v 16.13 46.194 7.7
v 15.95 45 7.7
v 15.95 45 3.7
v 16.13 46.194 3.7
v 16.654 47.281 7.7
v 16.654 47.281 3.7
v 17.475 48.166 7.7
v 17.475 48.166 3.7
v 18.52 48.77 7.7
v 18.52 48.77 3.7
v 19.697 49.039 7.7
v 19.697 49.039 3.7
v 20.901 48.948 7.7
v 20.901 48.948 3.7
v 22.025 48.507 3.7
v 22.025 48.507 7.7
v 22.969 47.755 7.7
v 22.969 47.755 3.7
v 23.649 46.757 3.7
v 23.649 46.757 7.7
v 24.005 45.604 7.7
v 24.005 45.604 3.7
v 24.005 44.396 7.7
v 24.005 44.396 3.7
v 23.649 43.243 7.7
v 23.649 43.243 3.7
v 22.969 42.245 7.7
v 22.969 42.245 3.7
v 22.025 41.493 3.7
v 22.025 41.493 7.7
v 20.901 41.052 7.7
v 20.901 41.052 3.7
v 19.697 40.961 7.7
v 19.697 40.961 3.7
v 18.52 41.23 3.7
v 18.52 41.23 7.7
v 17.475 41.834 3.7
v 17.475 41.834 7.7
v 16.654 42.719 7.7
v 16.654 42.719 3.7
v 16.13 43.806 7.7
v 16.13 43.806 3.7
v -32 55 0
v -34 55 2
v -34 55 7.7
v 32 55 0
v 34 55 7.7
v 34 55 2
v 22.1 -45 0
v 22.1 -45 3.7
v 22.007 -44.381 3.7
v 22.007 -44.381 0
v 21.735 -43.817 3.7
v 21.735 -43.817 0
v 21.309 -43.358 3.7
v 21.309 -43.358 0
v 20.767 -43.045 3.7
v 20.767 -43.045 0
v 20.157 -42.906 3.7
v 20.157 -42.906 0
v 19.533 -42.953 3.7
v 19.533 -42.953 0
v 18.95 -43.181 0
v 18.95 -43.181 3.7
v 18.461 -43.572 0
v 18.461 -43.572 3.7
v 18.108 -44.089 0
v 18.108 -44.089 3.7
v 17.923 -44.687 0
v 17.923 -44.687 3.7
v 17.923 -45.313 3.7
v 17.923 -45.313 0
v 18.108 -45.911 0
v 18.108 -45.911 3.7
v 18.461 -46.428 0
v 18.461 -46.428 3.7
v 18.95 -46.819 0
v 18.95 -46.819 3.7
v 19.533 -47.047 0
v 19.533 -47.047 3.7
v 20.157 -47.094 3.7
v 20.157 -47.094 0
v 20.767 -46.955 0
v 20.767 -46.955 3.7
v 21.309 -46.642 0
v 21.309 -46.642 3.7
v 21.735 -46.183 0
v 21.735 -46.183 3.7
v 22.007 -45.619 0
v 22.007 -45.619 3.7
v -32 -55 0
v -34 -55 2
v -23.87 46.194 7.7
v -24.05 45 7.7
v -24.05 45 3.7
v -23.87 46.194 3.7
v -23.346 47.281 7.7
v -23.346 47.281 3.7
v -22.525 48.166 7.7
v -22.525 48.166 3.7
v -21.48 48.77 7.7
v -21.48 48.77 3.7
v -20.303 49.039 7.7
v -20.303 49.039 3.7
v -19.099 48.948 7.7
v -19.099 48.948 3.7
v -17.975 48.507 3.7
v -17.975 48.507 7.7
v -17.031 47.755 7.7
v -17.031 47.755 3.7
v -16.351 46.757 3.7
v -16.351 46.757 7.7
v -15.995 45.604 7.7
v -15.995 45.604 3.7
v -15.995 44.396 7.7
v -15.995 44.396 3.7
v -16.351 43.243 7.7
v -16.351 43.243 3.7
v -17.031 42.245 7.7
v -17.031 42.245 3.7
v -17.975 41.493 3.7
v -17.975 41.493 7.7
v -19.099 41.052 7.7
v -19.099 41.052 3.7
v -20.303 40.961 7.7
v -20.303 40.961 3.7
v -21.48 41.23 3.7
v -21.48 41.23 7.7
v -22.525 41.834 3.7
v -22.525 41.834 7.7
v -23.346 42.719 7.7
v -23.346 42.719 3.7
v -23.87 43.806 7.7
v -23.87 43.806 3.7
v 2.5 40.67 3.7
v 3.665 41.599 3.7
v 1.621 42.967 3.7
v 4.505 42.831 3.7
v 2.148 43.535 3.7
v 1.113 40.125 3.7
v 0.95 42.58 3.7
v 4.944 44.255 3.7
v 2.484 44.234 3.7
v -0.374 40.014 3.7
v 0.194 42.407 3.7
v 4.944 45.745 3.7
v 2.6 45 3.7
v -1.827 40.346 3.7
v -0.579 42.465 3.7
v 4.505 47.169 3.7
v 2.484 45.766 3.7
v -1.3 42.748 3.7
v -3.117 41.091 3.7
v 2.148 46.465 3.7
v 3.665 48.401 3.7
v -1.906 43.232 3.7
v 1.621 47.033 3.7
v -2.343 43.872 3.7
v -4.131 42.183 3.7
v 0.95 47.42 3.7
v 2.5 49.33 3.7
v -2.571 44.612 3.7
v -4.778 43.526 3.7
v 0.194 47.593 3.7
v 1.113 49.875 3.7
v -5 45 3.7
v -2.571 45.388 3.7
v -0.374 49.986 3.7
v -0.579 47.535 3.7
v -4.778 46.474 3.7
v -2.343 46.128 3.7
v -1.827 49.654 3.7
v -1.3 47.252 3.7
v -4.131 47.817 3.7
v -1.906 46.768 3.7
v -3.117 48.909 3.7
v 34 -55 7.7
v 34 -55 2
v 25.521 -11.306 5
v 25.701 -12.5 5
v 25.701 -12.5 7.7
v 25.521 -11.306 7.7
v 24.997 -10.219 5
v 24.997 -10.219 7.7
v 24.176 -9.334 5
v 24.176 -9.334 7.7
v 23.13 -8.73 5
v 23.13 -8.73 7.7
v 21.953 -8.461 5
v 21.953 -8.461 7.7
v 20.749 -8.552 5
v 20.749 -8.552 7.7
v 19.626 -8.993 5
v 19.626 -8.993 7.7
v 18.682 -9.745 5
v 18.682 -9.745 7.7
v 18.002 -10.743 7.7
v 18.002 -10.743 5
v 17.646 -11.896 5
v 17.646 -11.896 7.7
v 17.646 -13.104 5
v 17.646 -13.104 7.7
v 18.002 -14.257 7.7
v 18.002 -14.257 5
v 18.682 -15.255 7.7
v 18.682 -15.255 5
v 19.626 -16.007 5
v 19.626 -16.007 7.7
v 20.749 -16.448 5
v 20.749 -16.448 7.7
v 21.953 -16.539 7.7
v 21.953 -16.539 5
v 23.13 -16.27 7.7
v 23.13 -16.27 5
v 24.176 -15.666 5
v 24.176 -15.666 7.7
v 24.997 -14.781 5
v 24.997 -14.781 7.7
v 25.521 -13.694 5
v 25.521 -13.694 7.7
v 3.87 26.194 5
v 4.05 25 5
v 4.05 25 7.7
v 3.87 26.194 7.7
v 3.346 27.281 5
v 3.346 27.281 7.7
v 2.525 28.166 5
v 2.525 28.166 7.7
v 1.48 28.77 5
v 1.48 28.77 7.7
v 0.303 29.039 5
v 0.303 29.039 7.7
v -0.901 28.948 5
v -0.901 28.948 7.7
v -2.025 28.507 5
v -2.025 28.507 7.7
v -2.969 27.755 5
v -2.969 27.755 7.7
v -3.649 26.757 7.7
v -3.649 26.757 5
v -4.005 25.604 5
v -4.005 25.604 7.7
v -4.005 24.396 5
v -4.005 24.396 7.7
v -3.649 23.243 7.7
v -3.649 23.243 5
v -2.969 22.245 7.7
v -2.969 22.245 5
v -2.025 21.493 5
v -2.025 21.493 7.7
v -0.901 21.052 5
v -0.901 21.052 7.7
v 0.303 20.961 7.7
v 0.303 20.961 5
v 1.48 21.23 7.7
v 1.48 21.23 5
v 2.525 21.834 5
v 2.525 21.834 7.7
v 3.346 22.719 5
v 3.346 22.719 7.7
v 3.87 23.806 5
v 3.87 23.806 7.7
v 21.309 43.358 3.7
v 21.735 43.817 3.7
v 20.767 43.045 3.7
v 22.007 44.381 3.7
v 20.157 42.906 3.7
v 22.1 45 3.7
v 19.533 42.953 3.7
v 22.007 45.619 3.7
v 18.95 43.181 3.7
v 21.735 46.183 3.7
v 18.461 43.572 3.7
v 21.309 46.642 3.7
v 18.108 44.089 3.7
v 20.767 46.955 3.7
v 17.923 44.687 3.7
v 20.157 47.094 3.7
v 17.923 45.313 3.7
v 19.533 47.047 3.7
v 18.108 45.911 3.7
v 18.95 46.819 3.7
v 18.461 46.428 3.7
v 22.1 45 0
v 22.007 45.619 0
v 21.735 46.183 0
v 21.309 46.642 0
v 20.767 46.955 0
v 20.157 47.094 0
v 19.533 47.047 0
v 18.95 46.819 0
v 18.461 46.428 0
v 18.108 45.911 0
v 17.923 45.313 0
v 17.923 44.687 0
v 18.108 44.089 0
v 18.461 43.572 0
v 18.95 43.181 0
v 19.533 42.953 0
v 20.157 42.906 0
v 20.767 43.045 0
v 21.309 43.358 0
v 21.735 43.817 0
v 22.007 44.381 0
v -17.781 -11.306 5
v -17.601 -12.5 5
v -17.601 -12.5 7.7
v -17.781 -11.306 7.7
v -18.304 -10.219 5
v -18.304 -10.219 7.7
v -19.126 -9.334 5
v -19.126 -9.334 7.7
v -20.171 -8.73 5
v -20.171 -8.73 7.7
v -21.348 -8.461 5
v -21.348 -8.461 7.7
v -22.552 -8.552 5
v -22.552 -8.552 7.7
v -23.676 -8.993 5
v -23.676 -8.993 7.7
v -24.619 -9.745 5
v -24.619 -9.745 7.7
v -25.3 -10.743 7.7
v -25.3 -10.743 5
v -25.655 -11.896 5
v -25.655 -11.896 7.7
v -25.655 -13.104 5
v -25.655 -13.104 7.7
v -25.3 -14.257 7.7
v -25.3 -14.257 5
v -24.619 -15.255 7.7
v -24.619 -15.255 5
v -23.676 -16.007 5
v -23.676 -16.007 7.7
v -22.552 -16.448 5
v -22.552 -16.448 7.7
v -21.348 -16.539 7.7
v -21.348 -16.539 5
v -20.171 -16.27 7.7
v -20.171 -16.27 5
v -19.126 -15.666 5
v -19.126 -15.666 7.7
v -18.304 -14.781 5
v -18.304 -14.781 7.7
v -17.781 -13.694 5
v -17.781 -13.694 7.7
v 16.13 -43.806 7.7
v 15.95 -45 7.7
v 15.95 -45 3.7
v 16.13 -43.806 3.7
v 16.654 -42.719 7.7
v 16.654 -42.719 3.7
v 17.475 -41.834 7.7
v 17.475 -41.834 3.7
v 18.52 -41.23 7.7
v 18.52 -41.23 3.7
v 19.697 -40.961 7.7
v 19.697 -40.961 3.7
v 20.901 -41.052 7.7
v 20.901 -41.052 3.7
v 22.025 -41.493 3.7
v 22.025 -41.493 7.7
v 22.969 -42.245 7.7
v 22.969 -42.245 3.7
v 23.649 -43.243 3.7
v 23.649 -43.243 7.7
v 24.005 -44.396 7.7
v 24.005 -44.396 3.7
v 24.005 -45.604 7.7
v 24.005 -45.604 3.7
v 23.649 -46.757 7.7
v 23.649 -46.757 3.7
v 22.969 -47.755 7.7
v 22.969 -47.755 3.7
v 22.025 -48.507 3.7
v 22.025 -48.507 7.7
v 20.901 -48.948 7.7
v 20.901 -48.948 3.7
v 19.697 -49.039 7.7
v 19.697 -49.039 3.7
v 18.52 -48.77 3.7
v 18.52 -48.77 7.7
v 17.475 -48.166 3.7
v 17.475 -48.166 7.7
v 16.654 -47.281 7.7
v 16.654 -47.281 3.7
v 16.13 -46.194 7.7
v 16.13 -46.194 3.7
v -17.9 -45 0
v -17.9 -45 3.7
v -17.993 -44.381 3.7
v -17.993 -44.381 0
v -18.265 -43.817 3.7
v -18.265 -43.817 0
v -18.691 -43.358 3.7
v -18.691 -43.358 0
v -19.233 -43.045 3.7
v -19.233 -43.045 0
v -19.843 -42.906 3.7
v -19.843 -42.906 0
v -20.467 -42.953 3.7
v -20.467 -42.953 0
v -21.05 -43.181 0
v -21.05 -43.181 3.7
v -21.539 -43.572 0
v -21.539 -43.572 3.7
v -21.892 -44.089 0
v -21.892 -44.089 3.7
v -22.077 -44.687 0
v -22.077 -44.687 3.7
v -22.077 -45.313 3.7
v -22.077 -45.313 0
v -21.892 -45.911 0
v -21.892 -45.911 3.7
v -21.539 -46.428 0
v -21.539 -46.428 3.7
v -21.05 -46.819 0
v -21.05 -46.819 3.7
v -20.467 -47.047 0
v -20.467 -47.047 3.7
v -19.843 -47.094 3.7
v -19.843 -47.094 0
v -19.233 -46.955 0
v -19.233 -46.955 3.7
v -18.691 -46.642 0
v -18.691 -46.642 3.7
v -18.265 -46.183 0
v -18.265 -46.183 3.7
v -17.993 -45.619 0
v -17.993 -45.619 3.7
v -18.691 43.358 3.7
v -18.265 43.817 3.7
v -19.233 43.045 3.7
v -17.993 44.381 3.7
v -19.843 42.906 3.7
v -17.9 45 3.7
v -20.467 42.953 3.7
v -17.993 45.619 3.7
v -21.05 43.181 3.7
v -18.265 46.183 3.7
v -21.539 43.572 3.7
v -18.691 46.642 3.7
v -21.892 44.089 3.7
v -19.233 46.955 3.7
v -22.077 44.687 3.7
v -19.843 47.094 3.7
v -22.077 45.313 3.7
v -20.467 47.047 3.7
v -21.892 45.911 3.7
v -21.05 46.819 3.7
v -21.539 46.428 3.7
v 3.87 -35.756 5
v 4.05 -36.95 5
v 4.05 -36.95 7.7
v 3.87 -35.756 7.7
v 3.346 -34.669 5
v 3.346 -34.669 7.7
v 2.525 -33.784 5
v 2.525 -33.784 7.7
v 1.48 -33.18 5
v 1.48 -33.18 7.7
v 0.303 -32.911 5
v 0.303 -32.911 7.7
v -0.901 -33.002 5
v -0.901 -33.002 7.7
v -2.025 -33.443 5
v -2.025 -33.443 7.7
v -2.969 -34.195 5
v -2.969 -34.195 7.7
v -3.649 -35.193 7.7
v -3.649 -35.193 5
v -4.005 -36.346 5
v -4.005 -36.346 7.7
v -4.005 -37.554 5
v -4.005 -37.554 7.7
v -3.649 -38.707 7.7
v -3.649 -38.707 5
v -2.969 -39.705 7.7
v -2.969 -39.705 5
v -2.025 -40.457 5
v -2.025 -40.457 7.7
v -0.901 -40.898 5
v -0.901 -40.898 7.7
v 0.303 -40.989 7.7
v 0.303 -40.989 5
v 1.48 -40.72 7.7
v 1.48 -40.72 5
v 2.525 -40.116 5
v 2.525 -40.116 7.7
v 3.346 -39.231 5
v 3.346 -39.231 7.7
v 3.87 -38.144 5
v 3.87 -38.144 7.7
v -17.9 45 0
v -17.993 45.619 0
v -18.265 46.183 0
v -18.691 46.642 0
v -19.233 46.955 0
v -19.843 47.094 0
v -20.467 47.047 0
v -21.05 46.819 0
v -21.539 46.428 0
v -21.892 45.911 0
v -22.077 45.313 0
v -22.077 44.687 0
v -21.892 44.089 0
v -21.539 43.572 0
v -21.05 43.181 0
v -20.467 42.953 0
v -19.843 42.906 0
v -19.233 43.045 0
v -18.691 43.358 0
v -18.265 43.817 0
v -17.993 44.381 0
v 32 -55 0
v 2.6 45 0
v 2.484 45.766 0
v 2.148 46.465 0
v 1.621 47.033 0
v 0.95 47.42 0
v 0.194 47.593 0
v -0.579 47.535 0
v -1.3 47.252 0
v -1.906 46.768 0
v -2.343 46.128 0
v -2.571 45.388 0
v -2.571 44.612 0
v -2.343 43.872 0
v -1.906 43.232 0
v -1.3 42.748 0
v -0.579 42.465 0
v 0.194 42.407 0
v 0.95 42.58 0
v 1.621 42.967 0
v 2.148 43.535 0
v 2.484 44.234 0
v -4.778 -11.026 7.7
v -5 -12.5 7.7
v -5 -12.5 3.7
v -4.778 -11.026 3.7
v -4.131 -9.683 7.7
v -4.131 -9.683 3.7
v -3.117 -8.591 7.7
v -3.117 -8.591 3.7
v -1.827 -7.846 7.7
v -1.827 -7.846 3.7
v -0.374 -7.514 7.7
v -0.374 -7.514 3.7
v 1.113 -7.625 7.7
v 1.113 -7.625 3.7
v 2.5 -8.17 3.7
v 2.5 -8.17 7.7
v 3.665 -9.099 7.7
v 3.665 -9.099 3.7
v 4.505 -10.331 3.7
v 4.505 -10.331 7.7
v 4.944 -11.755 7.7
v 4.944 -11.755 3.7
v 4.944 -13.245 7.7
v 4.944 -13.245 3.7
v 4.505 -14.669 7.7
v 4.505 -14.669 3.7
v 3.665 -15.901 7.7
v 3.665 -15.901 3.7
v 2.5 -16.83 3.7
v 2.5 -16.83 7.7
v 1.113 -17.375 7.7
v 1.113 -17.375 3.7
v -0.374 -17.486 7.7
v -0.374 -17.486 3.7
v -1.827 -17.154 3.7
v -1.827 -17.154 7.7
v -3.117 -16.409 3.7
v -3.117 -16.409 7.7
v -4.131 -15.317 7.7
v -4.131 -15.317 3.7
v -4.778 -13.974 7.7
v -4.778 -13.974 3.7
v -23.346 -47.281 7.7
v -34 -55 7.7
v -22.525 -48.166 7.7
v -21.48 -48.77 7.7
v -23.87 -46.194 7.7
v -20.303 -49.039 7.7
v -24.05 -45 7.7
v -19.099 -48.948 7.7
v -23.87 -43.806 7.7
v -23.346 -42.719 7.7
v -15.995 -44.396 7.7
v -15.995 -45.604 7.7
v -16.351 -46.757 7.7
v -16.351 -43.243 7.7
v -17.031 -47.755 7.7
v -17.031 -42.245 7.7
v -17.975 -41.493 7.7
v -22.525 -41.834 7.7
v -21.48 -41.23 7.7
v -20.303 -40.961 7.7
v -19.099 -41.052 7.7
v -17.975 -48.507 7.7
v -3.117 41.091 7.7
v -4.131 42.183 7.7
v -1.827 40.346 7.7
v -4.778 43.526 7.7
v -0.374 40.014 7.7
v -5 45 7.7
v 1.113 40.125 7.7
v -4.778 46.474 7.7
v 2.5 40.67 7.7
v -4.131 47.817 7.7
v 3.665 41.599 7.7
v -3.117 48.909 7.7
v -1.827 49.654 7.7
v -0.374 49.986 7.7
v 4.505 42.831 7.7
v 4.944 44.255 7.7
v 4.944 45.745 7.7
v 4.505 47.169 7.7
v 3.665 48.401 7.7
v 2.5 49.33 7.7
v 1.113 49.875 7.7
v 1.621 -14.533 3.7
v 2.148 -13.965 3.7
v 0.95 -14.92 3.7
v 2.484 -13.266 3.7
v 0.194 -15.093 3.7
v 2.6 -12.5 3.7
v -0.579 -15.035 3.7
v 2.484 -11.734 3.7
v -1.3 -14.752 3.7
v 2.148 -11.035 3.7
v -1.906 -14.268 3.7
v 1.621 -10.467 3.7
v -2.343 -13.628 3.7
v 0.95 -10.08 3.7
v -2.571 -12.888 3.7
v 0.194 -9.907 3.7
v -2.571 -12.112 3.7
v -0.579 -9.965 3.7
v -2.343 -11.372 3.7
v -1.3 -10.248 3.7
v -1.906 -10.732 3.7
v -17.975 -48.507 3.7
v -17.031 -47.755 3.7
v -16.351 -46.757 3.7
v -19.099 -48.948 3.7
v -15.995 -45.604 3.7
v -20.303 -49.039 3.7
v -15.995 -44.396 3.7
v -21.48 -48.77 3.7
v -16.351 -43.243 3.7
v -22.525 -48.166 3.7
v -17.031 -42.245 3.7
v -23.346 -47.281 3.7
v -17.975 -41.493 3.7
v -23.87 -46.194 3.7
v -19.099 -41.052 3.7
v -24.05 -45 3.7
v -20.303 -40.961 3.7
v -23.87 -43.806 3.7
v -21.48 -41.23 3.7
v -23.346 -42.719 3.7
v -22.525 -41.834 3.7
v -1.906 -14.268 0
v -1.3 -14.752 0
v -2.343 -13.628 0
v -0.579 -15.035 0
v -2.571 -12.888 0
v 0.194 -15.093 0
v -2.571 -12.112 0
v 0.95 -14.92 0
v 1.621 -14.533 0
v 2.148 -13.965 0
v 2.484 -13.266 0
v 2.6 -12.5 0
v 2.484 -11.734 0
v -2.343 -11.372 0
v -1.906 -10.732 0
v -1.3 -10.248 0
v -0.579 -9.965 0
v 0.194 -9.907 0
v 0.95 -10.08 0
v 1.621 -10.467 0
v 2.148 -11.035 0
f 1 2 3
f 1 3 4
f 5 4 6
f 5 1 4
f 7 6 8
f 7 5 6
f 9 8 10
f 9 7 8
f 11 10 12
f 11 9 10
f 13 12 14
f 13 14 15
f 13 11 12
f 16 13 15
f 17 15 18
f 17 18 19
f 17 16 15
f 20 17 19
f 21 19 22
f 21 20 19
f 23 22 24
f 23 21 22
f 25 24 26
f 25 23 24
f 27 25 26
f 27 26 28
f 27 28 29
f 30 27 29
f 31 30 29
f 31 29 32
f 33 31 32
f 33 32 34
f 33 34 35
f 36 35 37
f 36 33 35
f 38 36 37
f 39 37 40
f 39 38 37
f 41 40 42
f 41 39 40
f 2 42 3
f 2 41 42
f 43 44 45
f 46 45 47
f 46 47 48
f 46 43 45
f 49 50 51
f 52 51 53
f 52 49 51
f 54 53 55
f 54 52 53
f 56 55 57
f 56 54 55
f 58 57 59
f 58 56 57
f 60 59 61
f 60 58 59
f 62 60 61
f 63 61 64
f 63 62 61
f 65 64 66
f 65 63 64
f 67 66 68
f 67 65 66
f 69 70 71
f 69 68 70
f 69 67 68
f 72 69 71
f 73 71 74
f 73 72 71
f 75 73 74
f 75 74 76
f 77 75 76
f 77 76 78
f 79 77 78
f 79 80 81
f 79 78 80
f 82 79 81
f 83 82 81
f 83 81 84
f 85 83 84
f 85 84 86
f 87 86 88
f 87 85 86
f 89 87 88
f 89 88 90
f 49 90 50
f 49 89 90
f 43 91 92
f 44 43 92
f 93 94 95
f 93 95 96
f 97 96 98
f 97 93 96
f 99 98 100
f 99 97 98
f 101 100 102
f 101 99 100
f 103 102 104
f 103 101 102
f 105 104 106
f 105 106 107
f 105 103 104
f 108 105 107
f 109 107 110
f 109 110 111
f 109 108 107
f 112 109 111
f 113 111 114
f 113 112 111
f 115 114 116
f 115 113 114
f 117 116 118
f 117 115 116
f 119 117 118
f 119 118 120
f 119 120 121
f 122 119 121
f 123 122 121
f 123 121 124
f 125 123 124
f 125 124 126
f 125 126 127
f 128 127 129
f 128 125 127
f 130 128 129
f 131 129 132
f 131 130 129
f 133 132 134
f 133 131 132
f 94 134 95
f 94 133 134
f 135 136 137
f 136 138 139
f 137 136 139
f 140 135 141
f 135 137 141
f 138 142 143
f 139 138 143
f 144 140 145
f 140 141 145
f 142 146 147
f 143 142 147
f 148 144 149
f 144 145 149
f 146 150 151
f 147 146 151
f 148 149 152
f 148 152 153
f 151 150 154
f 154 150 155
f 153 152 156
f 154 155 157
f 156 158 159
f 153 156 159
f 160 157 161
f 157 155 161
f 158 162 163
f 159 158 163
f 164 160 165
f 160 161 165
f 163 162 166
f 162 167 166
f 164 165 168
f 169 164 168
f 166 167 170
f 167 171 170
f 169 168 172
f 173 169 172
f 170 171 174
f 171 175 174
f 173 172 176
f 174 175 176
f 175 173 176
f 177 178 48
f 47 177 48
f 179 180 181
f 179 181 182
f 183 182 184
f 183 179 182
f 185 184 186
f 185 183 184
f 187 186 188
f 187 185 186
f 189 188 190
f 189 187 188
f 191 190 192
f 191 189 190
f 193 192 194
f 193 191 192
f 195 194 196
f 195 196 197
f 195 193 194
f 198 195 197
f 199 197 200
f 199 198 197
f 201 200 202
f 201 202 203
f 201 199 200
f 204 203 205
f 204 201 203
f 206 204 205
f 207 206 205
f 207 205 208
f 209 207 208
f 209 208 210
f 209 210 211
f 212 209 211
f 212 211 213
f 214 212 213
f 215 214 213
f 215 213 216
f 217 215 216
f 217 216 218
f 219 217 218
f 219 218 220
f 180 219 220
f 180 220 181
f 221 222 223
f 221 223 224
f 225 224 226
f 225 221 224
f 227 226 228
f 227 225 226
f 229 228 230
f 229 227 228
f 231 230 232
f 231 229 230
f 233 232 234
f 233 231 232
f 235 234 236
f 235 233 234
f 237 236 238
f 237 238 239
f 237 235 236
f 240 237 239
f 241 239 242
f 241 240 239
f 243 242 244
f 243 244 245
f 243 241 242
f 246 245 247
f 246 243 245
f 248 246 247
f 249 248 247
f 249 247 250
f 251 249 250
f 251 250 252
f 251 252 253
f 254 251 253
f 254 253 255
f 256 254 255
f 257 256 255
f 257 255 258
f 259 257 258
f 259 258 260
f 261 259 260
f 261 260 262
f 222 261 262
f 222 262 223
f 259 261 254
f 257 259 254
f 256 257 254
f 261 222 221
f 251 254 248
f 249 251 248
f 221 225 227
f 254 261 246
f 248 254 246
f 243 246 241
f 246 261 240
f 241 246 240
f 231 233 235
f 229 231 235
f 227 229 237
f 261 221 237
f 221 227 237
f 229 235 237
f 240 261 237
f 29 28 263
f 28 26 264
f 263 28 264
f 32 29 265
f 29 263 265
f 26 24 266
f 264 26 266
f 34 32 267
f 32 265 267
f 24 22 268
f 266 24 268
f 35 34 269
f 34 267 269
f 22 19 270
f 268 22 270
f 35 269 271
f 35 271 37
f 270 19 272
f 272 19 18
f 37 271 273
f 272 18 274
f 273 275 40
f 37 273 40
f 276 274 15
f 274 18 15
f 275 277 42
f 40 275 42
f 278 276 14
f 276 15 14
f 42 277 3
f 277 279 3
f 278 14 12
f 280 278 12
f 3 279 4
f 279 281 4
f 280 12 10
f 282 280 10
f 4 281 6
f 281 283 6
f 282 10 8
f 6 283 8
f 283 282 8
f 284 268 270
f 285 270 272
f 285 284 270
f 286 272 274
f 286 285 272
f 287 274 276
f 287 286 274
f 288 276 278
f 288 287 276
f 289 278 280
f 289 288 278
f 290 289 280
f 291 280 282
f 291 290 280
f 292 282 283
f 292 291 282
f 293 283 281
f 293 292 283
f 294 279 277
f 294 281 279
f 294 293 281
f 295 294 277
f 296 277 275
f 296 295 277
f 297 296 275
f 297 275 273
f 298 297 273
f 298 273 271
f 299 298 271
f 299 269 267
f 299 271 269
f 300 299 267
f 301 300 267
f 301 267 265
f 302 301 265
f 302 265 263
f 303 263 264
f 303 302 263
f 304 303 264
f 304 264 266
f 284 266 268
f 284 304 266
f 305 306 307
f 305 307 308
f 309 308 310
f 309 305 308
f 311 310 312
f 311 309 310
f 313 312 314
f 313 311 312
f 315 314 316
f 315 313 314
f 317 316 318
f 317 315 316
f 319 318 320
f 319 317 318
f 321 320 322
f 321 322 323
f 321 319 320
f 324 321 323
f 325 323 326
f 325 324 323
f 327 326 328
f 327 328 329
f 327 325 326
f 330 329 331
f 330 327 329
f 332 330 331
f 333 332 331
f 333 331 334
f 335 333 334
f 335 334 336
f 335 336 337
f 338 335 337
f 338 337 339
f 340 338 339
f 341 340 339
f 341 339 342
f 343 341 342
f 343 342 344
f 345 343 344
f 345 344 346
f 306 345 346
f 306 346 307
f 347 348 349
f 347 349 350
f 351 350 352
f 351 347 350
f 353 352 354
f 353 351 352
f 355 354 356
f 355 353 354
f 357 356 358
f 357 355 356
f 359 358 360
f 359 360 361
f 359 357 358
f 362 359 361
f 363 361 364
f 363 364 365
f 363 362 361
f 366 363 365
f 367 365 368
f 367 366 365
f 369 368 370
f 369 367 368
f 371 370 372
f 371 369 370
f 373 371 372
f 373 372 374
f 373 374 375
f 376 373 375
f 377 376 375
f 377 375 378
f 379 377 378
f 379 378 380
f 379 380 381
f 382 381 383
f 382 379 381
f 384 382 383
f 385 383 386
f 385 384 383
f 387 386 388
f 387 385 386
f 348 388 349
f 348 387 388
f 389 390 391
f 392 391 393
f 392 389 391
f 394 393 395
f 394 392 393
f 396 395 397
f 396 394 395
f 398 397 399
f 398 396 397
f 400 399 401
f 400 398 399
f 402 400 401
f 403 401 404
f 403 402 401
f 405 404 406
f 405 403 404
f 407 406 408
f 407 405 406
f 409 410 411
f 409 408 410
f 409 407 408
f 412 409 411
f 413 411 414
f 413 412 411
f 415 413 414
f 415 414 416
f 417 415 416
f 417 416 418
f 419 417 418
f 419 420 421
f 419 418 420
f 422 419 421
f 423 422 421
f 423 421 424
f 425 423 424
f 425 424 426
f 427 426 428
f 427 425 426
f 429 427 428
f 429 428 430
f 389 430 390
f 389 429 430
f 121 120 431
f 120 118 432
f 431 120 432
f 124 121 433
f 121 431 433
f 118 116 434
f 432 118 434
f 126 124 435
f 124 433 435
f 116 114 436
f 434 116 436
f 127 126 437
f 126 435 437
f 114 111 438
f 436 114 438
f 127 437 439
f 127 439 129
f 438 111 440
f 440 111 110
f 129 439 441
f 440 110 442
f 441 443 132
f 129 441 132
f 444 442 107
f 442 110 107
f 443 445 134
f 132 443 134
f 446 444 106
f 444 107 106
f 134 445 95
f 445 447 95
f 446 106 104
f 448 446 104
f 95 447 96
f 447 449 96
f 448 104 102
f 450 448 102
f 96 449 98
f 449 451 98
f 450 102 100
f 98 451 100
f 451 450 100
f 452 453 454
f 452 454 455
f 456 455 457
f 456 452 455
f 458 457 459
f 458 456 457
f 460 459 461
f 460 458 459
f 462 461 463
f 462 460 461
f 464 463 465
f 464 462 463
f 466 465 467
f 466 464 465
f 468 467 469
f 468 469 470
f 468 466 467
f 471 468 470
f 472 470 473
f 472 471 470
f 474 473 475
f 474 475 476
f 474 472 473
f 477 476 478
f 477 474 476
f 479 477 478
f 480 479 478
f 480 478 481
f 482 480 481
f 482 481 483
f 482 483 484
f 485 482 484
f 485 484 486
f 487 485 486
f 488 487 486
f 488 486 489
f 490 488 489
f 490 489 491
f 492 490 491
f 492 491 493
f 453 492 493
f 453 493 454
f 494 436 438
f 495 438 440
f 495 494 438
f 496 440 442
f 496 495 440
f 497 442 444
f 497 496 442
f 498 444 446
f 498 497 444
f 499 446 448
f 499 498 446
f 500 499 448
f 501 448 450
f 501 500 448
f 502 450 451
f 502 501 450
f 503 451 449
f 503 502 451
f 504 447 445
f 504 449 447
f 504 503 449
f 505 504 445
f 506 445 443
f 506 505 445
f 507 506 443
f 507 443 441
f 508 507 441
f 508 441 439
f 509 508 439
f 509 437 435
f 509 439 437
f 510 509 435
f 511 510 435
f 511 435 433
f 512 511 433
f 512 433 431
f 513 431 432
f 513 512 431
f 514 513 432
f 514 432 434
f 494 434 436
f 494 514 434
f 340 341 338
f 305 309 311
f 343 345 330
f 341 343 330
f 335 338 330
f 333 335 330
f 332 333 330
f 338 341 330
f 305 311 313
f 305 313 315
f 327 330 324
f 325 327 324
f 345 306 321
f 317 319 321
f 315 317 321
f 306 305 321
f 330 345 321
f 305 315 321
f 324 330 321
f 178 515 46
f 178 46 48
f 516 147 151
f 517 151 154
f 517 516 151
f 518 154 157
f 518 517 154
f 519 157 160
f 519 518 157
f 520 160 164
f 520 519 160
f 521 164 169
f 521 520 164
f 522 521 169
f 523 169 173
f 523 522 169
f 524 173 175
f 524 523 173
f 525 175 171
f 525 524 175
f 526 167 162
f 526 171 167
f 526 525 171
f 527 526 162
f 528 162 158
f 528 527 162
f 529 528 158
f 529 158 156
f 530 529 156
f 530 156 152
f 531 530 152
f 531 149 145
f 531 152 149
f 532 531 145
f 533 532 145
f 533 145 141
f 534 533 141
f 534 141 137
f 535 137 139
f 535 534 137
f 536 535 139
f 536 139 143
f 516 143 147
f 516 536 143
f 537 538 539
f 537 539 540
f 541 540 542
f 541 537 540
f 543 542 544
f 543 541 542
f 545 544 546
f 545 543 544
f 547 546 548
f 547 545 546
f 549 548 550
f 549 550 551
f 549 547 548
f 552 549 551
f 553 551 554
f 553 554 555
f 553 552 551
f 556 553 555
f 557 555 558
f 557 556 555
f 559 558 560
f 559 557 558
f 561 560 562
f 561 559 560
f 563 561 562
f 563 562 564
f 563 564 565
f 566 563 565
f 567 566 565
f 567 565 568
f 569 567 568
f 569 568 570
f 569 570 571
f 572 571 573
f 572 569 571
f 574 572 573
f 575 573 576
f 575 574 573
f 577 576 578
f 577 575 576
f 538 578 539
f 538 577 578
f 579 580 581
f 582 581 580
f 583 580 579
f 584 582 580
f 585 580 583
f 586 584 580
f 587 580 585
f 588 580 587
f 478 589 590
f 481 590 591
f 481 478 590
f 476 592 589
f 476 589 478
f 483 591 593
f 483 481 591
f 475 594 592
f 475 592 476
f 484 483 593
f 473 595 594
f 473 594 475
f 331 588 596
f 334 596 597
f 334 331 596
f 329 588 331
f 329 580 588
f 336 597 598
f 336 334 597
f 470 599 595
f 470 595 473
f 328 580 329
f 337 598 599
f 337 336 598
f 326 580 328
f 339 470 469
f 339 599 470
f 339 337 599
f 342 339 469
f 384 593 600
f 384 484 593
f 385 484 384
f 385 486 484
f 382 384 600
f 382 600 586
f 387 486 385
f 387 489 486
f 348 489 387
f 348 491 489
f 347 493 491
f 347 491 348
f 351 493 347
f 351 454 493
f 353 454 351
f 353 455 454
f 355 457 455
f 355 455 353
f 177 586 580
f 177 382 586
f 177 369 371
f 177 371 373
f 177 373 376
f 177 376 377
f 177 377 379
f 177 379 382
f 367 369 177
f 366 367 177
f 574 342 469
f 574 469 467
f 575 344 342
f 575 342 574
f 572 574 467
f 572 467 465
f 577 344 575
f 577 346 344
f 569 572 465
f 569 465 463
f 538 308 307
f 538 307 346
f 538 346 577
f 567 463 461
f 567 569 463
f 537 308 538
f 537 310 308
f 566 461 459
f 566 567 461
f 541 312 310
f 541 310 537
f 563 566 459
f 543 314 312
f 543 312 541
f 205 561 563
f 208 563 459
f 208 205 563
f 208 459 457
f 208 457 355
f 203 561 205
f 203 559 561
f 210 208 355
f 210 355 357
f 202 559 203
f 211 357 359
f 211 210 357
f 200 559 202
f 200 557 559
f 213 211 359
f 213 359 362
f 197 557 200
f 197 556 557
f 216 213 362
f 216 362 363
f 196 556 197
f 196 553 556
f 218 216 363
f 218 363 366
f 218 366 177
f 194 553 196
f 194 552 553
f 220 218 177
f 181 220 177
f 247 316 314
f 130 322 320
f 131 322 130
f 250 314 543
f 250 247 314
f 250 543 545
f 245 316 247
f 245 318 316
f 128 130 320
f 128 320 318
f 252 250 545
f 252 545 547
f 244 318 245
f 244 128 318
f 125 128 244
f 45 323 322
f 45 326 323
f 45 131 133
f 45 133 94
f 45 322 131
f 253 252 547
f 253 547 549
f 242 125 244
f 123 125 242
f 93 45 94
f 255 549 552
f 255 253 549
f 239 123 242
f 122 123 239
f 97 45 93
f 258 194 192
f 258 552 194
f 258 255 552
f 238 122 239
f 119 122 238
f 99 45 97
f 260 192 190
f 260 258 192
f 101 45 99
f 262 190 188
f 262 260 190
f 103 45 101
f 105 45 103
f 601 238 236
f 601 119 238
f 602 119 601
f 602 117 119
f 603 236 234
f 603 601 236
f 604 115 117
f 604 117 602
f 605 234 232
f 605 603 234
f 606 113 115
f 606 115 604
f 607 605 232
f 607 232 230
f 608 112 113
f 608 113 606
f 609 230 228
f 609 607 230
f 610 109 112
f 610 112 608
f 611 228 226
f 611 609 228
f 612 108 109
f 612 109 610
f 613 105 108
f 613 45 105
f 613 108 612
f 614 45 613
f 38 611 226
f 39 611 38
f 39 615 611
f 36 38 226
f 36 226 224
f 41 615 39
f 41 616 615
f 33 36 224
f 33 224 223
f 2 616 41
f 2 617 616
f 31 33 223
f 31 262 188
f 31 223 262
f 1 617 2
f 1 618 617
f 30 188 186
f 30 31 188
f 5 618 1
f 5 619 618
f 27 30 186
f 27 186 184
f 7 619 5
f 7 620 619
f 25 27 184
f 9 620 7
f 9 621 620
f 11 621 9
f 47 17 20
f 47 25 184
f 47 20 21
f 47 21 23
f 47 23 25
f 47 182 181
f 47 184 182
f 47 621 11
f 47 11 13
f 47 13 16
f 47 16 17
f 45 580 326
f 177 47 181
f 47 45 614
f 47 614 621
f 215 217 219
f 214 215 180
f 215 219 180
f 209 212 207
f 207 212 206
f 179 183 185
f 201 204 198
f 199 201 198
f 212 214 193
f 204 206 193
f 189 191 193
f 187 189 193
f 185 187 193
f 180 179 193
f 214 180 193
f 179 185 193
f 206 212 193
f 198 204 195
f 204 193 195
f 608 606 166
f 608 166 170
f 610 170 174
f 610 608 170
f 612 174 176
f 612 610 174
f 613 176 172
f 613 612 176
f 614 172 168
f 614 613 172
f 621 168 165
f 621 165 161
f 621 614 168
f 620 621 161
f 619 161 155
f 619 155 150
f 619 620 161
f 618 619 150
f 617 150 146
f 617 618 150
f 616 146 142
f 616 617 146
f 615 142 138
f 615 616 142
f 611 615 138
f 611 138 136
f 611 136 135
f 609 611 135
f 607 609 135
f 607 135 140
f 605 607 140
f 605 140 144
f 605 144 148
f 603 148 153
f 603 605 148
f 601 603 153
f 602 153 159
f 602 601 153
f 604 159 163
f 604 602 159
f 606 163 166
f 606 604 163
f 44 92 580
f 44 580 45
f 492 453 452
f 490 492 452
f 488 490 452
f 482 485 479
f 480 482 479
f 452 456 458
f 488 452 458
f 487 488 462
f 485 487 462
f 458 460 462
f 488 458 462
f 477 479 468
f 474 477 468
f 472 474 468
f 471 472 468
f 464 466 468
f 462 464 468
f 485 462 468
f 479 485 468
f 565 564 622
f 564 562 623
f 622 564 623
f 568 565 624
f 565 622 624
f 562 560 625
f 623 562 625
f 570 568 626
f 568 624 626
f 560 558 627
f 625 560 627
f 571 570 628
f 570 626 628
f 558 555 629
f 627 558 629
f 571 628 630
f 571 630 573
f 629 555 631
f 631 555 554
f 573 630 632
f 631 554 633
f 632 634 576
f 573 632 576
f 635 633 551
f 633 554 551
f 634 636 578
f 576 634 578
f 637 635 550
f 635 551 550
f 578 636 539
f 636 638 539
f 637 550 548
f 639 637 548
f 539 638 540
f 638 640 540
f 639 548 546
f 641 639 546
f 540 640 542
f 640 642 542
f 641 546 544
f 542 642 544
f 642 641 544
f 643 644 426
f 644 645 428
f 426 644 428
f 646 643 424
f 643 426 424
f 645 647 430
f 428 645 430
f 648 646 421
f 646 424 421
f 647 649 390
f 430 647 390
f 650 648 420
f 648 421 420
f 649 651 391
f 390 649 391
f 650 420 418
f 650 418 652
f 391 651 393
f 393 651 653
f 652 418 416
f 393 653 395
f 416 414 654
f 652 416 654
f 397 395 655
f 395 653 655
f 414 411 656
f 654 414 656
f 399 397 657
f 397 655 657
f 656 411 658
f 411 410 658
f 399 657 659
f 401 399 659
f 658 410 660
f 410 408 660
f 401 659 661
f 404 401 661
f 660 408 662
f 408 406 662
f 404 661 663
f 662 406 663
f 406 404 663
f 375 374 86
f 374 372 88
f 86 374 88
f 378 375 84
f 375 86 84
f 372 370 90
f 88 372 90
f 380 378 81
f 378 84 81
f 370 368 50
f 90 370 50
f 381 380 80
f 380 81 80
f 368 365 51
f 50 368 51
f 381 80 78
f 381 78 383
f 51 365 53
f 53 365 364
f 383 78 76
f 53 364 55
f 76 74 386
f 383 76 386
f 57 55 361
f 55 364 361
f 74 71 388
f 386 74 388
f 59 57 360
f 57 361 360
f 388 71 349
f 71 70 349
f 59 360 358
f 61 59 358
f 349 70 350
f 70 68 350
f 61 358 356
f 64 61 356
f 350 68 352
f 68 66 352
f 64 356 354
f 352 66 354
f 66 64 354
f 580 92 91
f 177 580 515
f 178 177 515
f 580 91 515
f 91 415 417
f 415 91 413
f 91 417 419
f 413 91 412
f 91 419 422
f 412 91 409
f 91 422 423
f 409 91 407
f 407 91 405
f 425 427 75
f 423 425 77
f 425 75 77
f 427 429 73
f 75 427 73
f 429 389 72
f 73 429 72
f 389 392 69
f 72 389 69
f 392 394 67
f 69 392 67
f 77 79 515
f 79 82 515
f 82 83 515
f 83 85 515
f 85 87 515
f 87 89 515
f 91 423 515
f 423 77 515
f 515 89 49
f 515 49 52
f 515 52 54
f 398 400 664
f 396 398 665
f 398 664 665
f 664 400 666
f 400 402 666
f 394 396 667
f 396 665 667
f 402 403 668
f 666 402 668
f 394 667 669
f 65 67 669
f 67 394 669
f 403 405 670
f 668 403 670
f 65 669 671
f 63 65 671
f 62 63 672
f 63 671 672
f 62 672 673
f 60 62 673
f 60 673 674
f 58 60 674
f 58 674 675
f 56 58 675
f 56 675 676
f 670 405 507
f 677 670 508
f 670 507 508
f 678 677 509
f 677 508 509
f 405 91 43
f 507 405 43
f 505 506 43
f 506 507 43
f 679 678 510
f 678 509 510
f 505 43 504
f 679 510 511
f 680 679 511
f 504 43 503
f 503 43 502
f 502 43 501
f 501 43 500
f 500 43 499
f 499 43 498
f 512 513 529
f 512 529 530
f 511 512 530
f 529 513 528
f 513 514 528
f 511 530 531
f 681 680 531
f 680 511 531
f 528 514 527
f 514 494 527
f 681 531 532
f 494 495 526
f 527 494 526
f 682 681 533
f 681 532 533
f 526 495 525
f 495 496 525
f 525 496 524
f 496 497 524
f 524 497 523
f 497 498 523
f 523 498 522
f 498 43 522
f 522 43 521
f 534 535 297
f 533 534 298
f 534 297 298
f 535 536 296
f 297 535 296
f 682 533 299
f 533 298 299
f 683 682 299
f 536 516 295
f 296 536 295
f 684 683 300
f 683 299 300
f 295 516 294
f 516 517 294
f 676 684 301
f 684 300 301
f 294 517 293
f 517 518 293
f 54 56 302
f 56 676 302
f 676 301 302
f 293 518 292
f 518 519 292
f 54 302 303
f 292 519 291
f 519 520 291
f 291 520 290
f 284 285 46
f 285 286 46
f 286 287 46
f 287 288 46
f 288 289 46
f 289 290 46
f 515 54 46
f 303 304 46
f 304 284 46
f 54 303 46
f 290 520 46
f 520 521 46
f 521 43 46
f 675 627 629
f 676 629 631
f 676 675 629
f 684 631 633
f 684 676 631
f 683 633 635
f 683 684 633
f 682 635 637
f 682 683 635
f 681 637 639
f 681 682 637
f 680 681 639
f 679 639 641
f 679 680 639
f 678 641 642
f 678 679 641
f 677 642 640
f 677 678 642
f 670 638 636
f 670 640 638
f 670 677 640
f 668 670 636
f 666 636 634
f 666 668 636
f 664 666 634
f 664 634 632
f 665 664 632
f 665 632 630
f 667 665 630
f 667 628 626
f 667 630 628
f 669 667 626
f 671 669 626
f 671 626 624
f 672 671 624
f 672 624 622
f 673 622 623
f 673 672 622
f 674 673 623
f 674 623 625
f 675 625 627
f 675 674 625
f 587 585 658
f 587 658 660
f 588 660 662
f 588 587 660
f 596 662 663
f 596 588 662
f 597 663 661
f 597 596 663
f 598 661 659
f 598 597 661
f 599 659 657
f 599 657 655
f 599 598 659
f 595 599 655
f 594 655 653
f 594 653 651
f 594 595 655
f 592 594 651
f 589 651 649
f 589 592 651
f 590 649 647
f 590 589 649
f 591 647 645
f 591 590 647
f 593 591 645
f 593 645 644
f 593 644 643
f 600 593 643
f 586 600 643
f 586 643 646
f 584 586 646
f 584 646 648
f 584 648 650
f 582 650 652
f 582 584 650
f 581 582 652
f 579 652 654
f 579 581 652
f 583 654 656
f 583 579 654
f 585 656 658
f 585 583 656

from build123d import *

# Parameters (mm, degrees)
SKETCH1_W           = 68
SKETCH1_H           = 110
SKETCH1_R           = 2.1
SKETCH1_R_2         = 4.05
SKETCH1_R_3         = 2.6
BOSS_EXTRUDE1_DEPTH = 7.7
SKETCH2_R           = 6.304633146
SKETCH2_R_2         = 7.334333348
SKETCH2_R_3         = 8.114040952
SKETCH2_R_4         = 11.073656437
BOSS_EXTRUDE2_DEPTH = 5
SKETCH3_R           = 4.05
SKETCH3_R_2         = 5
CUT_EXTRUDE1_DEPTH  = 4
CUT_EXTRUDE2_DEPTH  = 111


with BuildPart() as part:
    # Sketch1 → Boss-Extrude1 (new body)
    with BuildSketch(Plane.XY):
        Rectangle(SKETCH1_W, SKETCH1_H)
        with Locations((20, 45)):
            Circle(SKETCH1_R, mode=Mode.SUBTRACT)
        with Locations((-20, 45)):
            Circle(SKETCH1_R, mode=Mode.SUBTRACT)
        with Locations((20, -45)):
            Circle(SKETCH1_R, mode=Mode.SUBTRACT)
        with Locations((-20, -45)):
            Circle(SKETCH1_R, mode=Mode.SUBTRACT)
        with Locations((21.650635095, -12.5)):
            Circle(SKETCH1_R_2, mode=Mode.SUBTRACT)
        with Locations((0, 25)):
            Circle(SKETCH1_R_2, mode=Mode.SUBTRACT)
        with Locations((-21.650635095, -12.5)):
            Circle(SKETCH1_R_2, mode=Mode.SUBTRACT)
        with Locations((0, -36.95)):
            Circle(SKETCH1_R_2, mode=Mode.SUBTRACT)
        with Locations((0, 45)):
            Circle(SKETCH1_R_3, mode=Mode.SUBTRACT)
        with Locations((0, -12.5)):
            Circle(SKETCH1_R_3, mode=Mode.SUBTRACT)
    extrude(amount=BOSS_EXTRUDE1_DEPTH)

    # Sketch2 → Boss-Extrude2 (add)
    with BuildSketch(Plane(origin=(0, 0, 0), x_dir=(-1, 0, 0), z_dir=(0, 0, -1))):
        with Locations((-21.650635095, -12.5)):
            Circle(SKETCH2_R)
        with Locations((0, 25)):
            Circle(SKETCH2_R_2)
        with Locations((21.650635095, -12.5)):
            Circle(SKETCH2_R_3)
        with Locations((0, -36.95)):
            Circle(SKETCH2_R_4)
    extrude(amount=-BOSS_EXTRUDE2_DEPTH)

    # Sketch3 → Cut-Extrude1 (cut)
    with BuildSketch(Plane(origin=(0, 0, 7.7), x_dir=(-1, 0, 0), z_dir=(0, 0, -1))):
        with Locations((-20, 45)):
            Circle(SKETCH3_R)
        with Locations((20, 45)):
            Circle(SKETCH3_R)
        with Locations((-20, -45)):
            Circle(SKETCH3_R)
        with Locations((20, -45)):
            Circle(SKETCH3_R)
        with Locations((0, 45)):
            Circle(SKETCH3_R_2)
        with Locations((0, -12.5)):
            Circle(SKETCH3_R_2)
    extrude(amount=CUT_EXTRUDE1_DEPTH, mode=Mode.SUBTRACT)

    # Sketch4 → Cut-Extrude2 (cut, through all)
    with BuildSketch(Plane.XZ.offset(55)):
        Polygon((34, 2), (34, 0), (32, 0), align=None)
        Polygon((-34, 15.4), (-39, 15.4), (-39, 0), (-34, 0), (-32, 0), (-34, 2), align=None)
    extrude(amount=-CUT_EXTRUDE2_DEPTH, mode=Mode.SUBTRACT)


solid = part.part
